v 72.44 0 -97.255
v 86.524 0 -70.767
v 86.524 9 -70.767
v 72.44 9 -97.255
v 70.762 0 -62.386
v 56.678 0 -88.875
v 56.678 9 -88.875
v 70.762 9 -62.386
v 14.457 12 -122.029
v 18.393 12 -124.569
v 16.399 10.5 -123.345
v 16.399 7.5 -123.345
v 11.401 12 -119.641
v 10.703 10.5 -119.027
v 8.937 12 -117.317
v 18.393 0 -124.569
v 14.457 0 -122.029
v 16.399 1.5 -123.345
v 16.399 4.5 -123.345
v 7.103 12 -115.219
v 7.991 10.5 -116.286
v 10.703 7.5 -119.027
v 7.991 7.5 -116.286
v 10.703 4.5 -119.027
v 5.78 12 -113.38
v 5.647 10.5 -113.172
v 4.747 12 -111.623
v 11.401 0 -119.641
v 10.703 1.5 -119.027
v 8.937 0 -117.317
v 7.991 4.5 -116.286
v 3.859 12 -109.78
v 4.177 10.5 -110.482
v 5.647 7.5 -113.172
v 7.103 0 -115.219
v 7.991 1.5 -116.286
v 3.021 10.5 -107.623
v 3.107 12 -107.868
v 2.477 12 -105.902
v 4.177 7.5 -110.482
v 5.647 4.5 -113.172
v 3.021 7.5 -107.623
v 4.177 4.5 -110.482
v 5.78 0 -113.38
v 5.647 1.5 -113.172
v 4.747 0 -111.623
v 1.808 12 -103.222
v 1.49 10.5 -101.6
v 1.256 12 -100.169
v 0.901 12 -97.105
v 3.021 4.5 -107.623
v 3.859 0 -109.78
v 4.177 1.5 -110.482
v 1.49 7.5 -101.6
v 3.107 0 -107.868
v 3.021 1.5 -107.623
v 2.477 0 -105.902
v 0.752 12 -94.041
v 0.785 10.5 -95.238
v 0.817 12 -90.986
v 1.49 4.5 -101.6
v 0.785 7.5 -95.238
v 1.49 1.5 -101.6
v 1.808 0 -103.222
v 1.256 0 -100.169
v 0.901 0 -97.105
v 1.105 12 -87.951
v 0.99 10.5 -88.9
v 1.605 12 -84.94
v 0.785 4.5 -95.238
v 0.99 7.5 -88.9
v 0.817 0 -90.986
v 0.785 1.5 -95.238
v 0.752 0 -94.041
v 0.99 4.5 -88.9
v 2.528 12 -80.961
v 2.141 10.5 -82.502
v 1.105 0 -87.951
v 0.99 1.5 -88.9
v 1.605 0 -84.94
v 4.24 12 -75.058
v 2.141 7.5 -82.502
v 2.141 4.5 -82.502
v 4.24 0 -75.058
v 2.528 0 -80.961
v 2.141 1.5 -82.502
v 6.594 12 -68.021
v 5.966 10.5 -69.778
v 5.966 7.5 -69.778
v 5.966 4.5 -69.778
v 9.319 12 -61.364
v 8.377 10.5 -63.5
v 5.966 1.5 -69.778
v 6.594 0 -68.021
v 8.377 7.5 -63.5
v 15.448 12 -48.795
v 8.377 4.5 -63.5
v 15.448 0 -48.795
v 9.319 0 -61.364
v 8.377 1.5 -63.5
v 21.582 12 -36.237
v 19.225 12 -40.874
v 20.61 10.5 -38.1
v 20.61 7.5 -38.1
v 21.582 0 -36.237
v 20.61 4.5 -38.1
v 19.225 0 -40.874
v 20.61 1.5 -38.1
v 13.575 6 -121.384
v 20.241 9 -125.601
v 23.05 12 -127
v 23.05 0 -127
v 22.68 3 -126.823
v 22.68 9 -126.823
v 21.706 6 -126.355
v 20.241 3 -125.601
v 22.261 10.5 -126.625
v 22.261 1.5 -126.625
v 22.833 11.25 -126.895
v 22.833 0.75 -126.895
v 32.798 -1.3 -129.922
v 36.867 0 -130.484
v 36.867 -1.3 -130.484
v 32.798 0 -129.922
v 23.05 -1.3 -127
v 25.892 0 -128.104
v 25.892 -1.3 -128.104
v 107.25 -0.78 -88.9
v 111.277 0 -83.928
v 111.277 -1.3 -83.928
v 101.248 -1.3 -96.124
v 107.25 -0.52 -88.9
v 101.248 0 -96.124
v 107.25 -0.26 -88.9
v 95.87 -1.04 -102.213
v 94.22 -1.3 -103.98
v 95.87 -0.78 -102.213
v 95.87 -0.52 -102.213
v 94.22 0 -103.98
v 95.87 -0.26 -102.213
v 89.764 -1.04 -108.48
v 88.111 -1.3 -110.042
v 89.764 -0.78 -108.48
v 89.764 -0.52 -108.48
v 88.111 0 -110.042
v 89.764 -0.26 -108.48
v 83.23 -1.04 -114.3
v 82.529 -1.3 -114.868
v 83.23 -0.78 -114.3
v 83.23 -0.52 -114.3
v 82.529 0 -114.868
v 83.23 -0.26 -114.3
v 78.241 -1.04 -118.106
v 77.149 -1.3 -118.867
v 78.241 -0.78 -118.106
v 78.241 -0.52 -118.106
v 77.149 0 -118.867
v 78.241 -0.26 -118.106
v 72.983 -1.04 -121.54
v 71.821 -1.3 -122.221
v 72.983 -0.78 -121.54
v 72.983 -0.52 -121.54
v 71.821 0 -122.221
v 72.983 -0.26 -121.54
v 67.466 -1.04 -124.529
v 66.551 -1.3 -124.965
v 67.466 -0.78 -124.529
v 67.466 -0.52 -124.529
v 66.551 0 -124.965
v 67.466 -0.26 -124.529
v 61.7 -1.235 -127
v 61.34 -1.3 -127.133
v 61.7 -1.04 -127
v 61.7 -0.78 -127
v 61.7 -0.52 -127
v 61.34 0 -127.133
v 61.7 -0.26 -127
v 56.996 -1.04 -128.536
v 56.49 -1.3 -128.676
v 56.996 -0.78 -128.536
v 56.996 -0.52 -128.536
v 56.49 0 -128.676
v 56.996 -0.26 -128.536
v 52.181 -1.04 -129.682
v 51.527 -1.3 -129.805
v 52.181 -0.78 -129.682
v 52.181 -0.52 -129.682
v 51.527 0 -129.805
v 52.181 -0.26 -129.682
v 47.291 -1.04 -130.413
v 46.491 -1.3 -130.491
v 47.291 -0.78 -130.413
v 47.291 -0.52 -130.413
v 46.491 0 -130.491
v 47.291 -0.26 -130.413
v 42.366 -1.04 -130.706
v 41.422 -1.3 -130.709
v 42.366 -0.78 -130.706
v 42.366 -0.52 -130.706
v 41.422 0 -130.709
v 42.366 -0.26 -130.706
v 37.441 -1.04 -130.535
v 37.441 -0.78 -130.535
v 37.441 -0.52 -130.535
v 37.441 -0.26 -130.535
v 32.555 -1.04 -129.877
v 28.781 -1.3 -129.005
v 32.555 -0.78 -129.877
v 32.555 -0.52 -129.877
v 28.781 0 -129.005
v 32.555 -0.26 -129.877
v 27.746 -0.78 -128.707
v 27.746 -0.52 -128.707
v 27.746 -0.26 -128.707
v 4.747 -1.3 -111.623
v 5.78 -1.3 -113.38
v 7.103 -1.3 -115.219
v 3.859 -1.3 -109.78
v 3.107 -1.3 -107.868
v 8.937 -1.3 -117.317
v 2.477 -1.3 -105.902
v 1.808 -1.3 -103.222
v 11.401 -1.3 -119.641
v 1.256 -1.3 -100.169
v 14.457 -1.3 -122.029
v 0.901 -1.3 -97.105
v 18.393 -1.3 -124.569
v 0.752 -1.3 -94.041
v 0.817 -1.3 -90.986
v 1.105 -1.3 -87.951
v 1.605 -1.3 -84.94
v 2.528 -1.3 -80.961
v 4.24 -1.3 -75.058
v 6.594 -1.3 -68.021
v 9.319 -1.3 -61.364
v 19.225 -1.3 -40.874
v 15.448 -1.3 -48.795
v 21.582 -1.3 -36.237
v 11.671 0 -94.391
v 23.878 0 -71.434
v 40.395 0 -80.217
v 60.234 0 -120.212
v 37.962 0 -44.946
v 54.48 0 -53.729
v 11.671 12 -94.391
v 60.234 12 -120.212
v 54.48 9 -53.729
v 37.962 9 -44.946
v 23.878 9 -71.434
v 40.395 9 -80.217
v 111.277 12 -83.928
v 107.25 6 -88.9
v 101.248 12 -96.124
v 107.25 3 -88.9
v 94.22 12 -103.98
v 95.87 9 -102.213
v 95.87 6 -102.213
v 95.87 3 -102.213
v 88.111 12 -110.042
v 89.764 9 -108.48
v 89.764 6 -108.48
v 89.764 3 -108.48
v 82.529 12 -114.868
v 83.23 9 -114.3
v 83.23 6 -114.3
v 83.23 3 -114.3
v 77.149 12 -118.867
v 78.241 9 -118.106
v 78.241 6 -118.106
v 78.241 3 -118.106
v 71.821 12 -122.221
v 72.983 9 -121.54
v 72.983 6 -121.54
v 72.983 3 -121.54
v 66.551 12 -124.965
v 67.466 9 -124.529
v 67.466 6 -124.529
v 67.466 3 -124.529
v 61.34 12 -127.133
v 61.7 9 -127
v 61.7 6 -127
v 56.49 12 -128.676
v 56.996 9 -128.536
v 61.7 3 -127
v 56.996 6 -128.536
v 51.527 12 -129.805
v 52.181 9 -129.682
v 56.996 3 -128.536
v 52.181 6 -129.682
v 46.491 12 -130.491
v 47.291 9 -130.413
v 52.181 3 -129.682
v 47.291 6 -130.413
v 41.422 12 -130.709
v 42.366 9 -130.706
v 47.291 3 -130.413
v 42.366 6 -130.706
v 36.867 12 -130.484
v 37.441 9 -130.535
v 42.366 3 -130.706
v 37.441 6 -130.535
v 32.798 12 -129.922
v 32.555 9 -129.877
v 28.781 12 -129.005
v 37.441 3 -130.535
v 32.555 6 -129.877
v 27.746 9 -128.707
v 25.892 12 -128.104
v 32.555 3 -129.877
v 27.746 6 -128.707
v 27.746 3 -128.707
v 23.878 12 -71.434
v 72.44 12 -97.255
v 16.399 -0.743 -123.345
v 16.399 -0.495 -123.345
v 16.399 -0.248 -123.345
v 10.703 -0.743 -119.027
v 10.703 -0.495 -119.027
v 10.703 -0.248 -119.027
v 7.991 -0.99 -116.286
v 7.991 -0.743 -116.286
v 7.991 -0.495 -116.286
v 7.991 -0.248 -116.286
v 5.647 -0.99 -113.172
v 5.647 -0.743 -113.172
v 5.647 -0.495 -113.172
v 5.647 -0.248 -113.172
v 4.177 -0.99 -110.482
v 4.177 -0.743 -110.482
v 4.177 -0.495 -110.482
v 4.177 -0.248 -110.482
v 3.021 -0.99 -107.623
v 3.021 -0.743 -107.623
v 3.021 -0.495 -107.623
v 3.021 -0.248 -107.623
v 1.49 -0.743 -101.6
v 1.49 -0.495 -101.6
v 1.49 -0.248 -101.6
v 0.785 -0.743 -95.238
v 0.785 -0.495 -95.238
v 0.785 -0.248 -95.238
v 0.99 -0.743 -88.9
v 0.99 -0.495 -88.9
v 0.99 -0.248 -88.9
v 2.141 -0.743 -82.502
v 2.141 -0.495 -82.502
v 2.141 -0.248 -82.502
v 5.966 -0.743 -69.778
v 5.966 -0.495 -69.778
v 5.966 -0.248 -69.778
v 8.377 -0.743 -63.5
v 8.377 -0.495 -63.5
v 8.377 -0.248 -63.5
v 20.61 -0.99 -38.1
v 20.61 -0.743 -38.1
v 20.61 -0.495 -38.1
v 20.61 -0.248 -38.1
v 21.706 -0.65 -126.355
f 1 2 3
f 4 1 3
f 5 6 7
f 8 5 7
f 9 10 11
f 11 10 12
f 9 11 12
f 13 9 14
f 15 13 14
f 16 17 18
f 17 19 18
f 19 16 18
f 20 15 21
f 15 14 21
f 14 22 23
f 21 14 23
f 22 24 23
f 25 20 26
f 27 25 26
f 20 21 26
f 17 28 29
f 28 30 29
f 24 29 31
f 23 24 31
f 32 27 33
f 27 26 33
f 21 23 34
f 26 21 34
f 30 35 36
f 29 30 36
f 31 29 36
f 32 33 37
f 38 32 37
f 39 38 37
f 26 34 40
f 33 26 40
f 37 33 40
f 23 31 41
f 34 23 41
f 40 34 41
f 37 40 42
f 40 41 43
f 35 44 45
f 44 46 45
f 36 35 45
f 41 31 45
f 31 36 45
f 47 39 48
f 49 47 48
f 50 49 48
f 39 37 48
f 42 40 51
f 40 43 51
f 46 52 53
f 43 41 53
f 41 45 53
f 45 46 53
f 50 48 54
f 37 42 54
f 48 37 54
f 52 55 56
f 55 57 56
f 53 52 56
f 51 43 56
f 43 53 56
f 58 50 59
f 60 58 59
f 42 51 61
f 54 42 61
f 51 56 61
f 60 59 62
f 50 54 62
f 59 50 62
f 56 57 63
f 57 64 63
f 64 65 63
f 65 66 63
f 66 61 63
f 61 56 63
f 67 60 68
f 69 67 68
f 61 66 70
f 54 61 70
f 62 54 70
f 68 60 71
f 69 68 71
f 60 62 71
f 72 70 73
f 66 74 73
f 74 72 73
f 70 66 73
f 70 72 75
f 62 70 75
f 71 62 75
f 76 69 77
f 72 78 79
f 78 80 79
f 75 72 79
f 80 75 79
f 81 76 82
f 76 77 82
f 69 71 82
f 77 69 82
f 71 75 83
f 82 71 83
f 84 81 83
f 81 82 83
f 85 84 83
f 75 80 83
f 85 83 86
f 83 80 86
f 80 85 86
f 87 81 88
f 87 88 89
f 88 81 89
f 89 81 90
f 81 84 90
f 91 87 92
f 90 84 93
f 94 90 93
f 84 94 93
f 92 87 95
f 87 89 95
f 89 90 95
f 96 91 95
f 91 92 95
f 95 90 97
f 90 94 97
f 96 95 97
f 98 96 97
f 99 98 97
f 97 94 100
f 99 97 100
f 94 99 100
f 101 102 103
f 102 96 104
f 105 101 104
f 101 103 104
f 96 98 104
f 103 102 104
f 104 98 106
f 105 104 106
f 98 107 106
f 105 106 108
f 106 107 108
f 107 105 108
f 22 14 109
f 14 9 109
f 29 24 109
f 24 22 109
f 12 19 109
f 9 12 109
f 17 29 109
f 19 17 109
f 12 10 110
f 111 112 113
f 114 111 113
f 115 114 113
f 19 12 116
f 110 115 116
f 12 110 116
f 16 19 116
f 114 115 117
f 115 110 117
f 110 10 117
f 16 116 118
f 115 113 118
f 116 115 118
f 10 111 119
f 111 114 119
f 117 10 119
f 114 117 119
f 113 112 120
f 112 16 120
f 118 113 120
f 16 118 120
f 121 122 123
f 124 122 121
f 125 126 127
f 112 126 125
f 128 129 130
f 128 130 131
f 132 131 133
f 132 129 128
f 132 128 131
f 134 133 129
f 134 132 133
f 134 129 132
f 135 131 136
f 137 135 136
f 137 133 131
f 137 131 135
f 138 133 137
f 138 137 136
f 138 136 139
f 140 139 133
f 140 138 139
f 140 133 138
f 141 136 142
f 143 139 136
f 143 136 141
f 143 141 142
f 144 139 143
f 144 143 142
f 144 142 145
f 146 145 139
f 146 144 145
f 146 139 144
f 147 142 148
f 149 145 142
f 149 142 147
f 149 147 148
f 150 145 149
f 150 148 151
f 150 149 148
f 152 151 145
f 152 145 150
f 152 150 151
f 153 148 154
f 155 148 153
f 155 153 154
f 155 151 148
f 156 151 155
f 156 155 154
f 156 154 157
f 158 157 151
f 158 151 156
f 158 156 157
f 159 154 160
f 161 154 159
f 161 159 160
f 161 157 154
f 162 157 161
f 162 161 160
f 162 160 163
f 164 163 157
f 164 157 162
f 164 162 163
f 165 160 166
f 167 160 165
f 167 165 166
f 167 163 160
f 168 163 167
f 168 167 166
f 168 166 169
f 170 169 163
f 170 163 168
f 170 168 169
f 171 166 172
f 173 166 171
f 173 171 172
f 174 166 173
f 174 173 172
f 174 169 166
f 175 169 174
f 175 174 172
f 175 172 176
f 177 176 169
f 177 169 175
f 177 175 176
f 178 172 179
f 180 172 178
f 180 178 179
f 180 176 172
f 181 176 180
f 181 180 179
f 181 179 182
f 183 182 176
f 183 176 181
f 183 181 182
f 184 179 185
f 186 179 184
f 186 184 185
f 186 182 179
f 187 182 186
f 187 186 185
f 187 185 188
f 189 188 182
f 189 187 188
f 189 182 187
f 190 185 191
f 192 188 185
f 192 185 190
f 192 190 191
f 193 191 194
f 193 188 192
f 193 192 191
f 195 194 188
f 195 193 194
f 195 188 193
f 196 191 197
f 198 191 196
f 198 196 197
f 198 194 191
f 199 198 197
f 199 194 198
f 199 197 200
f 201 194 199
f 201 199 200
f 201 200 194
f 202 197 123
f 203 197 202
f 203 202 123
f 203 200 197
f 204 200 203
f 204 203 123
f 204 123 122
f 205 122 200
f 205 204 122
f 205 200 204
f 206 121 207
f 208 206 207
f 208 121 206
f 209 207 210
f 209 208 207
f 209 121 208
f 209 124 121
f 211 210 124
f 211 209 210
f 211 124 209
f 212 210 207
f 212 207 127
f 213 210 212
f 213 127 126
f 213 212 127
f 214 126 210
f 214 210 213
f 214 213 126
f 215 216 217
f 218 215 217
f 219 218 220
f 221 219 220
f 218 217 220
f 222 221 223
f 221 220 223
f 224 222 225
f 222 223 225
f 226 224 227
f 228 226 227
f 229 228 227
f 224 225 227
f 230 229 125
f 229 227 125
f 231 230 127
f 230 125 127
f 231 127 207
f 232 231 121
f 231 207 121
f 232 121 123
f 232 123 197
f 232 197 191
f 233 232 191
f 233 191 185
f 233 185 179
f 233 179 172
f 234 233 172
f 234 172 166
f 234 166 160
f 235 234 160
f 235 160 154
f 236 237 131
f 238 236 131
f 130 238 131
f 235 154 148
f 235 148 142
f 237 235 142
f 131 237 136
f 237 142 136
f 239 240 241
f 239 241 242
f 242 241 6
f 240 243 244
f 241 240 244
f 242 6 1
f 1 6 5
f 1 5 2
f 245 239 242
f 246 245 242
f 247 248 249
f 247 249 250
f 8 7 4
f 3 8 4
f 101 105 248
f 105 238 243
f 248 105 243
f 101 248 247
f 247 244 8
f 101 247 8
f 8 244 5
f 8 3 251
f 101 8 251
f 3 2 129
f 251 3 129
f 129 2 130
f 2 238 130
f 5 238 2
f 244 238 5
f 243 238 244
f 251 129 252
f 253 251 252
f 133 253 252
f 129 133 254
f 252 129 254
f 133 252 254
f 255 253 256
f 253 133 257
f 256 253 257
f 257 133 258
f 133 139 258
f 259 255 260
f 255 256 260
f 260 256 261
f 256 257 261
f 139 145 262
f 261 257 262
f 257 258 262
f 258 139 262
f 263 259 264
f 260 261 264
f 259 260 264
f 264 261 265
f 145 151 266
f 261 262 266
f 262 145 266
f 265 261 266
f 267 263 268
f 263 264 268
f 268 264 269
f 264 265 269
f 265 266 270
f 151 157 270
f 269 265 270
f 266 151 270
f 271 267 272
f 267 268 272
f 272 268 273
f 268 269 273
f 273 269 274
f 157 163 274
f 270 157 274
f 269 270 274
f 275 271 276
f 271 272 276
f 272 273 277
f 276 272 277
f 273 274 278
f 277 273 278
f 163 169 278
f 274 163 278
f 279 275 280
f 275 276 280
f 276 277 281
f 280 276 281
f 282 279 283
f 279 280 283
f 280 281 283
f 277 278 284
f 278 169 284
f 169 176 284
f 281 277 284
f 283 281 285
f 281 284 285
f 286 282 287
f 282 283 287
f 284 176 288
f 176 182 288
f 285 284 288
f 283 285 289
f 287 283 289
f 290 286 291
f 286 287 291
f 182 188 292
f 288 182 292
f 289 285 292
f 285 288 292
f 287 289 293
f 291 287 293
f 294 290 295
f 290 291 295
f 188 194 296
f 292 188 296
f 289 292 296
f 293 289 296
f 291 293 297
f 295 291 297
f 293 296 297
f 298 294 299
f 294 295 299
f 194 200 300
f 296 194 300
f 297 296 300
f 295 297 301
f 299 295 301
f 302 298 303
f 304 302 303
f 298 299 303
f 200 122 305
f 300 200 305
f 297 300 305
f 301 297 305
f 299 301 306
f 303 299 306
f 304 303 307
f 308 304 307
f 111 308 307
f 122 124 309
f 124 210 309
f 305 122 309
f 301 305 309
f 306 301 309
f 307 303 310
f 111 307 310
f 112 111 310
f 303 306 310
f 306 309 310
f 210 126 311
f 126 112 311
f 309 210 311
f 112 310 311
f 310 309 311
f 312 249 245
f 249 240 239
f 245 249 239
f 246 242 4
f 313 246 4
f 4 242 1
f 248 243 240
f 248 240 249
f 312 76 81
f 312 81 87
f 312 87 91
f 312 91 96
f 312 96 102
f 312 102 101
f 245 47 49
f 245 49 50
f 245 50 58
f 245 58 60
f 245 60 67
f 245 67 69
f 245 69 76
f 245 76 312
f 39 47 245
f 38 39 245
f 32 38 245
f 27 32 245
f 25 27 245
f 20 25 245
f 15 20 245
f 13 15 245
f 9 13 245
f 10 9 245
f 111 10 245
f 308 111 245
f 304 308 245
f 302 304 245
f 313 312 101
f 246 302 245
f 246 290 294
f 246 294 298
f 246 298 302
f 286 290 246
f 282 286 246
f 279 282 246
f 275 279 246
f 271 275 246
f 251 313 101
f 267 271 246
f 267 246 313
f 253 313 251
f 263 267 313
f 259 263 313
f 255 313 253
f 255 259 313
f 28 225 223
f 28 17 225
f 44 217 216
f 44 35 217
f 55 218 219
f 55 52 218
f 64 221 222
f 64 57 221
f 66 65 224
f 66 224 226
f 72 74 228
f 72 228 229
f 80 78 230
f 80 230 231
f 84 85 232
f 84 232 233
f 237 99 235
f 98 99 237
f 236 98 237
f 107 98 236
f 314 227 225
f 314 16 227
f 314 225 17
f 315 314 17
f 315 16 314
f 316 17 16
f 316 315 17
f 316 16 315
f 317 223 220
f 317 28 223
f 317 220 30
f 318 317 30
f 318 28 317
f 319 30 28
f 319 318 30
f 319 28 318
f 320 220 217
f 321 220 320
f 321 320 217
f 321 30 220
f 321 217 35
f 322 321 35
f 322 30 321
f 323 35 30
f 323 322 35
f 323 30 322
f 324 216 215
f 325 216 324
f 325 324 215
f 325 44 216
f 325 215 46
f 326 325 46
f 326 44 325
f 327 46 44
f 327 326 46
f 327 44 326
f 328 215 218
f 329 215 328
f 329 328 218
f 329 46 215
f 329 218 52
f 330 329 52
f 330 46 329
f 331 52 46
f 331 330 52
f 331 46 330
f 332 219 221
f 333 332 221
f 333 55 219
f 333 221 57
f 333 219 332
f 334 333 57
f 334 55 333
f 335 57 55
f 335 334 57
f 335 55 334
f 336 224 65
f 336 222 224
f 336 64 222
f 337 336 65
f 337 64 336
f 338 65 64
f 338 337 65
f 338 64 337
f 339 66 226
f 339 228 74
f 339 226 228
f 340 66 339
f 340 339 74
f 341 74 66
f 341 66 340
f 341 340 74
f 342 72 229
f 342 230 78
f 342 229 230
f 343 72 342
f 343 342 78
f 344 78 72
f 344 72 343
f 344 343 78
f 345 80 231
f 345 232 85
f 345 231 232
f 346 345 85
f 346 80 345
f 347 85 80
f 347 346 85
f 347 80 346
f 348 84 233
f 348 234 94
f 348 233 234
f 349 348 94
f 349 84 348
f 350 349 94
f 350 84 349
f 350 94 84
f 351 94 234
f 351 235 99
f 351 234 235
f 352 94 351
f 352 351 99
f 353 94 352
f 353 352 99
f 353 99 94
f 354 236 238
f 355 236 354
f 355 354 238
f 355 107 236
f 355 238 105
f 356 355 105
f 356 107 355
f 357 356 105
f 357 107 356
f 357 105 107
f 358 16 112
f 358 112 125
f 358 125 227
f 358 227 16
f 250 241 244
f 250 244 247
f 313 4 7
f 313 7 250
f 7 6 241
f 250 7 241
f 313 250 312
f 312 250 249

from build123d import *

# Parameters (mm, degrees)
BOSS_EXTRUDE1_DEPTH               = 1.3
BOSS_EXTRUDE2_DEPTH               = 12
CUT_TO_REMOVE_BOT_SOLE_DEPTH      = 234.592504803
CUT_TO_REMOVE_BOT_SOLE_DEPTH_BACK = 234.592504803
CUT_EXTRUDE4_REACH                = 167.31
SKETCH7_W                         = 18.70749212
SKETCH7_H                         = 9
SKETCH7_W_2                       = 17.851063772


with BuildPart() as part:
    # Sketch2 → Boss-Extrude1 (new body)
    with BuildSketch(Plane(origin=(0, 0, 0), x_dir=(1, 0, 0), z_dir=(0, 1, 0))):
        with BuildLine():
            add(Edge.make_bspline(
                [(23.05, 127), (22.943163576, 126.902857828), (6.620867571, 120.021081895), (0.931086245, 101.488970464), (0.324008086, 88.719210316), (3.825949637, 76.00589269), (8.107522159, 63.165811678), (14.622542207, 50.857319444), (20.477621735, 37.804703348), (28.027386546, 24.819252915), (38.054220669, 12.174080363), (50.087048562, -0.413905353), (63.515875121, -12.714926203), (76.995002025, -24.637109723), (87.753725412, -37.676814115), (96.95133677, -50.066381), (102.490643182, -63.337711531), (106.915198332, -76.285665463), (112.18840739, -88.815145737), (116.555805718, -101.829881852), (122.760488068, -115.656378348), (136.34325775, -130.188055829), (151.998790453, -139.029236195), (161.96, -136.1)],
                knots=[0, 0, 0, 0, 0.090945349, 0.12664197, 0.163655193, 0.201591738, 0.240816764, 0.281850131, 0.322917617, 0.365825557, 0.412648122, 0.463551179, 0.517804141, 0.571801955, 0.620389186, 0.665335117, 0.705885892, 0.745281612, 0.78501862, 0.824424381, 0.865568121, 0.915423297, 1, 1, 1, 1], degree=3))
            add(Edge.make_bspline(
                [(161.96, -136.1), (172.431616467, -132.923660625), (186.600337708, -121.715263252), (189.399120136, -101.609128058), (188.081273674, -88.738164313), (184.889467755, -75.876127028), (179.456656008, -63.289286222), (173.0414801, -50.841874911), (166.79981093, -38.270821821), (161.60365795, -25.396077846), (156.248349303, -12.794060465), (151.450238349, -0.096351247), (147.526781794, 12.914664382), (141.825873335, 25.26402088), (137.37019782, 38.220879174), (131.875071866, 50.794972902), (126.706198444, 64.316783566), (117.282300149, 76.451578571), (103.420435284, 93.759455253), (86.842392664, 113.310643183), (58.200495652, 131.153143927), (35.386261, 132.287626366), (23.05, 127)],
                knots=[0, 0, 0, 0, 0.095093522, 0.131398848, 0.167295759, 0.204174646, 0.242856644, 0.282808561, 0.322537216, 0.361360107, 0.400063589, 0.438231587, 0.476003009, 0.514706491, 0.552943744, 0.591625742, 0.630784901, 0.674461238, 0.720301597, 0.818758385, 0.889157941, 1, 1, 1, 1], degree=3))
        make_face()
    extrude(amount=-BOSS_EXTRUDE1_DEPTH)

    # Sketch3 → Boss-Extrude2 (add)
    with BuildSketch(Plane(origin=(0, 0, 0), x_dir=(1, 0, 0), z_dir=(0, 1, 0))):
        with BuildLine():
            add(Edge.make_bspline(
                [(23.05, 127), (22.943163576, 126.902857828), (6.620867571, 120.021081895), (0.931086245, 101.488970464), (0.324008086, 88.719210316), (3.825949637, 76.00589269), (8.107522159, 63.165811678), (14.622542207, 50.857319444), (18.754484417, 41.646060206), (21.253091273, 36.855386406), (21.582029576, 36.236743436)],
                knots=[0, 0, 0, 0, 0.090945349, 0.12664197, 0.163655193, 0.201591738, 0.240816764, 0.281850131, 0.322917617, 0.329035738, 0.329035738, 0.329035738, 0.329035738], degree=3))
            Line((21.582029576, 36.236743436), (111.276939854, 83.928373203))
            add(Edge.make_bspline(
                [(111.276939854, 83.928373203), (109.94087902, 85.589385686), (101.272885125, 96.292152129), (86.842392664, 113.310643183), (58.200495652, 131.153143927), (35.386261, 132.287626366), (23.05, 127)],
                knots=[0.702273444, 0.702273444, 0.702273444, 0.702273444, 0.720301597, 0.818758385, 0.889157941, 1, 1, 1, 1], degree=3))
        make_face()
        Polygon((23.877677337, 71.434462523), (11.671416705, 94.391099938), (60.233534312, 120.212035891), (72.439794944, 97.255398476), align=None, mode=Mode.SUBTRACT)
    extrude(amount=BOSS_EXTRUDE2_DEPTH)

    # Sketch6 → Cut to remove bot sole (cut, two sides: drawn at the far end of the back side and taken through both)
    with BuildSketch(Plane(origin=(0, 0, 0), x_dir=(1, 0, 0), z_dir=(0, 1, 0)).offset(-CUT_TO_REMOVE_BOT_SOLE_DEPTH_BACK)):
        with BuildLine():
            Line((111.276939854, 83.928373203), (21.582029576, 36.236743436))
            add(Edge.make_bspline(
                [(21.582029576, 36.236743436), (23.560019233, 32.51668594), (28.463593854, 24.269137433), (38.054220669, 12.174080363), (50.087048562, -0.413905353), (63.515875121, -12.714926203), (76.995002025, -24.637109723), (87.753725412, -37.676814115), (96.95133677, -50.066381), (102.490643182, -63.337711531), (106.915198332, -76.285665463), (112.18840739, -88.815145737), (116.555805718, -101.829881852), (122.760488068, -115.656378348), (136.34325775, -130.188055829), (151.998790453, -139.029236195), (161.96, -136.1)],
                knots=[0.329035738, 0.329035738, 0.329035738, 0.329035738, 0.365825557, 0.412648122, 0.463551179, 0.517804141, 0.571801955, 0.620389186, 0.665335117, 0.705885892, 0.745281612, 0.78501862, 0.824424381, 0.865568121, 0.915423297, 1, 1, 1, 1], degree=3))
            add(Edge.make_bspline(
                [(161.96, -136.1), (172.431616467, -132.923660625), (186.600337708, -121.715263252), (189.399120136, -101.609128058), (188.081273674, -88.738164313), (184.889467755, -75.876127028), (179.456656008, -63.289286222), (173.0414801, -50.841874911), (166.79981093, -38.270821821), (161.60365795, -25.396077846), (156.248349303, -12.794060465), (151.450238349, -0.096351247), (147.526781794, 12.914664382), (141.825873335, 25.26402088), (137.37019782, 38.220879174), (131.875071866, 50.794972902), (126.706198444, 64.316783566), (118.602637041, 74.751431029), (113.338093865, 81.365913132), (111.276939854, 83.928373203)],
                knots=[0, 0, 0, 0, 0.095093522, 0.131398848, 0.167295759, 0.204174646, 0.242856644, 0.282808561, 0.322537216, 0.361360107, 0.400063589, 0.438231587, 0.476003009, 0.514706491, 0.552943744, 0.591625742, 0.630784901, 0.674461238, 0.702273444, 0.702273444, 0.702273444, 0.702273444], degree=3))
        make_face()
    extrude(amount=CUT_TO_REMOVE_BOT_SOLE_DEPTH + CUT_TO_REMOVE_BOT_SOLE_DEPTH_BACK, mode=Mode.SUBTRACT)

    # Sketch7 → Cut-Extrude4 (cut, up to next)
    with BuildSketch(Plane(origin=(-10.264055011, 0, -19.3038799), x_dir=(0.8829475928589329, 0, -0.46947156278587965), z_dir=(0.46947156278587965, 0, 0.8829475928589329)), mode=Mode.PRIVATE) as cut_extrude4_sk1:
        with Locations((63.972932545, 4.5)):
            Rectangle(SKETCH7_W, SKETCH7_H)
    cut_extrude4_tool1 = extrude(cut_extrude4_sk1.sketch, amount=-CUT_EXTRUDE4_REACH, mode=Mode.PRIVATE) & part.part
    # Sketch7 → Cut-Extrude4 (cut, up to next)
    with BuildSketch(Plane(origin=(-10.264055011, 0, -19.3038799), x_dir=(0.8829475928589329, 0, -0.46947156278587965), z_dir=(0.46947156278587965, 0, 0.8829475928589329)), mode=Mode.PRIVATE) as cut_extrude4_sk2:
        with Locations((100.693654599, 4.5)):
            Rectangle(SKETCH7_W_2, SKETCH7_H)
    cut_extrude4_tool2 = extrude(cut_extrude4_sk2.sketch, amount=-CUT_EXTRUDE4_REACH, mode=Mode.PRIVATE) & part.part
    add(cut_extrude4_tool1.solids().sort_by_distance((46.220692, 4.5, -49.337353))[0], mode=Mode.SUBTRACT)
    add(cut_extrude4_tool2.solids().sort_by_distance((78.643165, 4.5, -66.576687))[0], mode=Mode.SUBTRACT)


solid = part.part
